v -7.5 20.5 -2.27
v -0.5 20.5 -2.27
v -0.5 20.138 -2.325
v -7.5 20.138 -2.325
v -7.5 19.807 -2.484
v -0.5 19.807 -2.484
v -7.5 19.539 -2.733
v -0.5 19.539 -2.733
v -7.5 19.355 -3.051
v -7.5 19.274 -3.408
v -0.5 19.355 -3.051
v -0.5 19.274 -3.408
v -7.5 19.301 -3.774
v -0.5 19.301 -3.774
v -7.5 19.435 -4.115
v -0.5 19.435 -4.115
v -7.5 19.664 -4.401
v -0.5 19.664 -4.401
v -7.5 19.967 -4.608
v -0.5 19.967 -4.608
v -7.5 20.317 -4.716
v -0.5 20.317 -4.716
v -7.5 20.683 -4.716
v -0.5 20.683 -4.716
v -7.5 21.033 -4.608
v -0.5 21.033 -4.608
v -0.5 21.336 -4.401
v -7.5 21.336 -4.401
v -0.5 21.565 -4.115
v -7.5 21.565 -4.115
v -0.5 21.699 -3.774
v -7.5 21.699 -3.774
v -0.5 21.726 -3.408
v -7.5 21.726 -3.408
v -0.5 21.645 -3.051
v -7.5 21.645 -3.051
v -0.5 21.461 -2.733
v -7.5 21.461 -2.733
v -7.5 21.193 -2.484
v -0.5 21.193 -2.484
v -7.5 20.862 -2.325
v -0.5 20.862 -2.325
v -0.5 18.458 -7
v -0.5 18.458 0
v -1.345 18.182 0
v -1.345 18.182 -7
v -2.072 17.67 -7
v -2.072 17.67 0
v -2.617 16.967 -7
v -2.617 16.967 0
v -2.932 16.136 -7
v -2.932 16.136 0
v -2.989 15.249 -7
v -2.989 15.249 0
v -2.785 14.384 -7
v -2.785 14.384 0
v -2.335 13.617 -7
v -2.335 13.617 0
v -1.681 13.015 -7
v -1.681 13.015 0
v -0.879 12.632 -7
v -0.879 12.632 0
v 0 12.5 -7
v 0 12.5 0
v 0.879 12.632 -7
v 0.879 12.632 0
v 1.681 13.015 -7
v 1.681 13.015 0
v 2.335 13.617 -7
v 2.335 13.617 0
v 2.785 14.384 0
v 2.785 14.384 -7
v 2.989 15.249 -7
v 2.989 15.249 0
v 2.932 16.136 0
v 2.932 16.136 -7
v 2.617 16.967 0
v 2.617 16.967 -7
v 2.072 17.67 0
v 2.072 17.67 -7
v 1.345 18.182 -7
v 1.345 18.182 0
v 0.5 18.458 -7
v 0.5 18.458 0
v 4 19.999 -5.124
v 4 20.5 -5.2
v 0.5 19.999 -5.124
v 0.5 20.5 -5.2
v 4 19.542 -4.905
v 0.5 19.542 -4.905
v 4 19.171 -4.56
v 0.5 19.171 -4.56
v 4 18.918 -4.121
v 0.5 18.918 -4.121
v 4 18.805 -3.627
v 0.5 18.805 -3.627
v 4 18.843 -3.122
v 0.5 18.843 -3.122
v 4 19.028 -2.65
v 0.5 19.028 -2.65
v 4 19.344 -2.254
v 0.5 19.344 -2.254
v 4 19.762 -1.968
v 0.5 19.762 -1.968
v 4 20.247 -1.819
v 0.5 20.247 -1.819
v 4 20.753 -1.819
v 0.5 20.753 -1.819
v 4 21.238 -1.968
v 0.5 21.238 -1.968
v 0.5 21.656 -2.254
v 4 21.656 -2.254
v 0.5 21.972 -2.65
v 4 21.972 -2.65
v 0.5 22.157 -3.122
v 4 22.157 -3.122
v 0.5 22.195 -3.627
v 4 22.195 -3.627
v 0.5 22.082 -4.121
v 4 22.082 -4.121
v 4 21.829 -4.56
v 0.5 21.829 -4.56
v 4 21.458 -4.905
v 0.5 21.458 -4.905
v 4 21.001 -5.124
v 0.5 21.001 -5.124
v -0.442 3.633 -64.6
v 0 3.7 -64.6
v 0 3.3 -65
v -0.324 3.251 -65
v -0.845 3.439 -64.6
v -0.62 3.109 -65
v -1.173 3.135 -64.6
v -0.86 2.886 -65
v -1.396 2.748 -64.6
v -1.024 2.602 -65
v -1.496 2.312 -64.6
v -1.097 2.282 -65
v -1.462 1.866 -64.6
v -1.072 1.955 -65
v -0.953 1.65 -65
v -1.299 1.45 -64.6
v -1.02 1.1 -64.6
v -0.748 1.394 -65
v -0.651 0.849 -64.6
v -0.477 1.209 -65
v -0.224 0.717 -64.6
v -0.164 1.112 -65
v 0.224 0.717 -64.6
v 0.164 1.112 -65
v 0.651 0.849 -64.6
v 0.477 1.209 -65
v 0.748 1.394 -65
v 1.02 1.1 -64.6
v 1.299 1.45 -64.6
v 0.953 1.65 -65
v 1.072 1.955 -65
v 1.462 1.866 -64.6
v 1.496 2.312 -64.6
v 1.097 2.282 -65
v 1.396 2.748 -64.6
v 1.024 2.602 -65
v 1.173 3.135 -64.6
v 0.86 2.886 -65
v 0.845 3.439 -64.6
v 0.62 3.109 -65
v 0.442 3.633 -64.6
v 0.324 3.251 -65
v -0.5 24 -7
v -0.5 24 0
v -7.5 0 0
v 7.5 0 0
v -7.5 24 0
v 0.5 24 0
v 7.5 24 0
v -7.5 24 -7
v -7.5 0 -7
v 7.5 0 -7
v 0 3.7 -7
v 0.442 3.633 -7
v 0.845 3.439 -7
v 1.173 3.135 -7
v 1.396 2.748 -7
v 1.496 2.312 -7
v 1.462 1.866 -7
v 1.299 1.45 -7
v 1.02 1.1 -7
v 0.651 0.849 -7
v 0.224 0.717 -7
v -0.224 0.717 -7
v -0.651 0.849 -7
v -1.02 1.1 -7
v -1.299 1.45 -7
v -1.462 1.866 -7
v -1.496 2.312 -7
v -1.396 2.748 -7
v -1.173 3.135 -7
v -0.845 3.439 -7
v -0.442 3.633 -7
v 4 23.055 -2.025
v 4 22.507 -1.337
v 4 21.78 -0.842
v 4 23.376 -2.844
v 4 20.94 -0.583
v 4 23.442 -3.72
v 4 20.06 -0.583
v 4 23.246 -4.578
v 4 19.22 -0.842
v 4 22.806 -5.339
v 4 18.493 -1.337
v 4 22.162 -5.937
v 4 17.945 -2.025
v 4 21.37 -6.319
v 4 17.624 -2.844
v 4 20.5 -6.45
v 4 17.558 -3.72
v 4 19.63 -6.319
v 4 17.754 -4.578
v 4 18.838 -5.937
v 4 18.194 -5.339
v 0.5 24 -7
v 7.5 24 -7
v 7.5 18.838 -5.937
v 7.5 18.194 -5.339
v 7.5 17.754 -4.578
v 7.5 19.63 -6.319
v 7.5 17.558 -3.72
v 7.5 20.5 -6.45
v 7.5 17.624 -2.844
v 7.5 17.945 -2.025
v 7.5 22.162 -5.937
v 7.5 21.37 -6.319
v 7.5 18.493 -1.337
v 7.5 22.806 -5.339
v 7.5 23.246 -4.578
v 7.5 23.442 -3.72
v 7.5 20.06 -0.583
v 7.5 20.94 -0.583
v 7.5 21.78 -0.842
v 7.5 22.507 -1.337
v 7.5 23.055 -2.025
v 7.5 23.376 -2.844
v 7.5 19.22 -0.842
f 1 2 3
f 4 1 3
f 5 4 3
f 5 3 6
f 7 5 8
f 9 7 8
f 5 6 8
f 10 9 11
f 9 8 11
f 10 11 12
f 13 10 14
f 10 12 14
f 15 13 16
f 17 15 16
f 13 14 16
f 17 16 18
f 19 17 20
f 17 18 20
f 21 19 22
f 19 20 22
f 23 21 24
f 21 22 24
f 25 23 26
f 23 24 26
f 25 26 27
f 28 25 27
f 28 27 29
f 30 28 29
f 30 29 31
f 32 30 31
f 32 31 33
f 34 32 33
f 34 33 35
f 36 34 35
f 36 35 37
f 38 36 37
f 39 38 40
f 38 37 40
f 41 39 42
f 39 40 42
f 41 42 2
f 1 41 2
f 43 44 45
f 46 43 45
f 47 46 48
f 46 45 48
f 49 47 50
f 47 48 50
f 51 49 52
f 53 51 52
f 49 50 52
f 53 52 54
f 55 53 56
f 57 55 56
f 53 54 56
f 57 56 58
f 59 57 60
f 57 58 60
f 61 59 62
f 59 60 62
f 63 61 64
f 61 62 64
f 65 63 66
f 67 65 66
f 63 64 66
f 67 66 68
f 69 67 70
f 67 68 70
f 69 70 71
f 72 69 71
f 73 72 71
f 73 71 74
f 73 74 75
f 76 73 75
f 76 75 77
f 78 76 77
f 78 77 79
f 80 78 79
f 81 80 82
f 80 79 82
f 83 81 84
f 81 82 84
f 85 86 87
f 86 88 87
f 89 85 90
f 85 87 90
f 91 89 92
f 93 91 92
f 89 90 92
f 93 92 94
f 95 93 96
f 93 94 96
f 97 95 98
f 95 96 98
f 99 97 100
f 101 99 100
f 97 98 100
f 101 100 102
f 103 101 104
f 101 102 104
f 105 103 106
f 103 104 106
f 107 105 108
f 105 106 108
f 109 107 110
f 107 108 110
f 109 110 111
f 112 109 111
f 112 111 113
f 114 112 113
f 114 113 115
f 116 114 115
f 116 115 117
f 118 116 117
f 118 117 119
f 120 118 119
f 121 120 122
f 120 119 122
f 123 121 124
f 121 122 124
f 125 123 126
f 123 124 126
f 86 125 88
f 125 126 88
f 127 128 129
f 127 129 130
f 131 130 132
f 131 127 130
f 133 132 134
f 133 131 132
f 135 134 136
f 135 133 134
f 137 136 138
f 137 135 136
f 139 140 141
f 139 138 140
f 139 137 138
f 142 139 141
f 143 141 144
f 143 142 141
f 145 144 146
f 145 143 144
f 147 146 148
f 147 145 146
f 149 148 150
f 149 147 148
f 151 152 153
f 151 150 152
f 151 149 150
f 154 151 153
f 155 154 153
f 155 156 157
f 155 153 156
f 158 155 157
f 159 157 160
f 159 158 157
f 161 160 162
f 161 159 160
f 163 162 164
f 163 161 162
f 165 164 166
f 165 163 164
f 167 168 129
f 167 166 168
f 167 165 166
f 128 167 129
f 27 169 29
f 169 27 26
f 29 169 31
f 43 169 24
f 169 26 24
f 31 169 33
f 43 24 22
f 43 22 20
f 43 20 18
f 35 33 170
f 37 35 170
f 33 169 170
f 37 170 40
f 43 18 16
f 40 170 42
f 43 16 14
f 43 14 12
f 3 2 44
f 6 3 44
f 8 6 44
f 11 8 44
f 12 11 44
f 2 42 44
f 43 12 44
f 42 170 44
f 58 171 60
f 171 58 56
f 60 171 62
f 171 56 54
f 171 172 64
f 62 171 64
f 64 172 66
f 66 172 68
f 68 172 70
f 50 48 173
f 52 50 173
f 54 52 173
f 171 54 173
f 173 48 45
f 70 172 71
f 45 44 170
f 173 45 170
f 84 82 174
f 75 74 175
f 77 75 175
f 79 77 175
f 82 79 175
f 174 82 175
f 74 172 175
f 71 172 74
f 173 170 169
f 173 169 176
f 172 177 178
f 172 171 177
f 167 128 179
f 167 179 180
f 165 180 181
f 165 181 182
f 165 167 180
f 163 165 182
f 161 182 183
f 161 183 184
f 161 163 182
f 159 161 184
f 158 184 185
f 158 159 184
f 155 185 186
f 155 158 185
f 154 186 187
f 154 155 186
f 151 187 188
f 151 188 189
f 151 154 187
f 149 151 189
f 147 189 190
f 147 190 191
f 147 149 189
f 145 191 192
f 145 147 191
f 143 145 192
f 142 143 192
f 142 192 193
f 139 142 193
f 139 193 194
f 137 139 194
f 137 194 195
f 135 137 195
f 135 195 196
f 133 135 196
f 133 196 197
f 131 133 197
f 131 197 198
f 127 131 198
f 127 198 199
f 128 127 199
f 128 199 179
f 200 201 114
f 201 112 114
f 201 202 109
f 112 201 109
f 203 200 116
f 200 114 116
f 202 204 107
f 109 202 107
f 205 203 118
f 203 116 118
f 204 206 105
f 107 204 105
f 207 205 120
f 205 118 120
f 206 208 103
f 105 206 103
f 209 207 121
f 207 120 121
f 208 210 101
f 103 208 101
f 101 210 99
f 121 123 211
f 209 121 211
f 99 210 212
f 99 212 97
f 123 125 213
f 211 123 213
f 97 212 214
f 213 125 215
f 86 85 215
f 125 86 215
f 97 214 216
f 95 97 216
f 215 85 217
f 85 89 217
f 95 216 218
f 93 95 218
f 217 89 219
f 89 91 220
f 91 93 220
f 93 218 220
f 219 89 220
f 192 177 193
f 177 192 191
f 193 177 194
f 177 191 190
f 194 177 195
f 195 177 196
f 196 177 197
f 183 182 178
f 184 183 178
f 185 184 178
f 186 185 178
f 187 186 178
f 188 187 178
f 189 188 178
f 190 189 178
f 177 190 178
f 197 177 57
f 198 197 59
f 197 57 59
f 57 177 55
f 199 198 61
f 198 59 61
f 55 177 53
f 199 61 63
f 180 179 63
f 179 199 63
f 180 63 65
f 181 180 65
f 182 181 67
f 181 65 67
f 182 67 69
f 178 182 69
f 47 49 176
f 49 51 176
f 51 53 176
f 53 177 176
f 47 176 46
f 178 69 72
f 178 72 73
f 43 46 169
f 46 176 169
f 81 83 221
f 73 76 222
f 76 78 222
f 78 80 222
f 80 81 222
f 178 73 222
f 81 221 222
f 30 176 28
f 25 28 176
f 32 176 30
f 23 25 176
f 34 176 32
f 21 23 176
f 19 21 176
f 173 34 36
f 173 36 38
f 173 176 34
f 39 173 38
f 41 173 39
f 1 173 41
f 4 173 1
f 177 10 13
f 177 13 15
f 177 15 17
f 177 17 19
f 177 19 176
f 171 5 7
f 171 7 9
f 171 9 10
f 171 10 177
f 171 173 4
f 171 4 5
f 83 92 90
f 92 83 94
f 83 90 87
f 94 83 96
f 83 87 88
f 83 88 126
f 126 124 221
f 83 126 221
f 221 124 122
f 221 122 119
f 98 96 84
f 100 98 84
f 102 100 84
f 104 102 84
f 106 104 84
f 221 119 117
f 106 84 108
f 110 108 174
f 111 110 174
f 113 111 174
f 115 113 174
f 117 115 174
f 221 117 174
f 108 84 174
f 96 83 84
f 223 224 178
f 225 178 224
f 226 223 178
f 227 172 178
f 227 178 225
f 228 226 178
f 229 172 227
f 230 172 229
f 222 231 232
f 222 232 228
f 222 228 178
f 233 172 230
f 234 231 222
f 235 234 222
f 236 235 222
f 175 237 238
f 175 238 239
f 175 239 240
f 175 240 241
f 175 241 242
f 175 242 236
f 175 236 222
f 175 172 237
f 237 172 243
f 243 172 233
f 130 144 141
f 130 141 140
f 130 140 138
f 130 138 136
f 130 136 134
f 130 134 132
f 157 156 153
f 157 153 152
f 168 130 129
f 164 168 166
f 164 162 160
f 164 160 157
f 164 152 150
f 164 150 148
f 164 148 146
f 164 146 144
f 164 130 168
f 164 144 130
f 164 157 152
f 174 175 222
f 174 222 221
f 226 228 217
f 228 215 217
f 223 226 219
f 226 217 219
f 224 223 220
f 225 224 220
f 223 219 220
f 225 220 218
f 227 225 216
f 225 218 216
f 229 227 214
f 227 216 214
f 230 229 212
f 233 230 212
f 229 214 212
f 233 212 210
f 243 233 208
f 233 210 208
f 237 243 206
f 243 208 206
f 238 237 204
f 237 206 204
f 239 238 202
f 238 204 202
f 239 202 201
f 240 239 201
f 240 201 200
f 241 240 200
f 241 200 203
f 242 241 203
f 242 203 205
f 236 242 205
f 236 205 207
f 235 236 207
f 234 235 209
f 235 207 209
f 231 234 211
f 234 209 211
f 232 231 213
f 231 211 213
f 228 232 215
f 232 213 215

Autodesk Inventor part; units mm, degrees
sketch "Sketch_1" plane through (0, 0, 0) normal (0, 0, 1) x (1, 0, 0)
  line L0 (-7.5, 24) -> (-7.5, 0)
  line L1 (-7.5, 0) -> (7.5, 0)
  line L2 (7.5, 0) -> (7.5, 24)
  line L3 (7.5, 24) -> (-7.5, 24)
extrude "Extrusion1" add sketch "Sketch_1" against normal blind 7
sketch "Sketch_3" plane through (0, 0, 0) normal (0, 0, 1) x (1, 0, 0)
  arc A0 (-0.5, 18.458) -> (0.5, 18.458) centre (0, 15.5) ccw
  line L0 (0.5, 18.458) -> (0.5, 24)
  line L1 (0.5, 24) -> (-0.5, 24)
  line L2 (-0.5, 24) -> (-0.5, 18.458)
extrude "Extrusion2" cut sketch "Sketch_3" against normal blind 7
sketch "Sketch3" plane through (7.5, 0, 0) normal (1, 0, 0) x (0, 0, -1)
  point P0 (3.5, 20.5)
hole "Hole1" at (7.5, 20.5, -3.5) direction (-1, 0, 0) diameter 3.4 depth 7.5 counterbore diameter 5.9 counterbore depth 3.5
sketch "Sketch4" plane through (-7.5, 0, 0) normal (-1, 0, 0) x (0, 0, 1)
  point P0 (-3.5, 20.5)
hole "Hole2" at (-7.5, 20.5, -3.5) direction (1, 0, 0) diameter 2.459 depth 7 thread size "M3x0.5" class "6H" standard "ISO Metric profile"
sketch "Sketch_6" plane through (0, 0, 0) normal (1, 0, 0) x (0, 1, 0)
  line L0 (2.2, -65) -> (2.2, 0)
  line L1 (2.2, 0) -> (3.7, 0)
  line L2 (3.7, 0) -> (3.7, -64.6)
  line L3 (3.7, -64.6) -> (3.3, -65)
  line L4 (3.3, -65) -> (2.2, -65)
  line L5 (2.2, -65) -> (2.2, 0)
revolve "Revolution1" add sketch "Sketch_6" angle 360 about axis through (0, 2.2, -65) along (0, 0, -1)
ref_plane "CP_PLATE_XY" through (0, 15.5, 0) normal (0, 0, 1) x (1, 0, 0)
ref_plane "CP_PLATE_YZ" through (0, 15.5, 0) normal (1, 0, 0) x (0, 1, 0)
ref_plane "CP_PLATE_ZX" through (0, 15.5, 0) normal (0, 1, 0) x (0, 0, 1)
ref_plane "CP_SCREW_XY" through (4, 20.5, -3.5) normal (1, 0, 0) x (0, 0, -1)
ref_plane "CP_SCREW_YZ" through (4, 20.5, -3.5) normal (0, 0, -1) x (0, 1, 0)
ref_plane "CP_SCREW_ZX" through (4, 20.5, -3.5) normal (0, 1, 0) x (1, 0, 0)
properties part number "4186566 DPDM 16-50---(p)"
